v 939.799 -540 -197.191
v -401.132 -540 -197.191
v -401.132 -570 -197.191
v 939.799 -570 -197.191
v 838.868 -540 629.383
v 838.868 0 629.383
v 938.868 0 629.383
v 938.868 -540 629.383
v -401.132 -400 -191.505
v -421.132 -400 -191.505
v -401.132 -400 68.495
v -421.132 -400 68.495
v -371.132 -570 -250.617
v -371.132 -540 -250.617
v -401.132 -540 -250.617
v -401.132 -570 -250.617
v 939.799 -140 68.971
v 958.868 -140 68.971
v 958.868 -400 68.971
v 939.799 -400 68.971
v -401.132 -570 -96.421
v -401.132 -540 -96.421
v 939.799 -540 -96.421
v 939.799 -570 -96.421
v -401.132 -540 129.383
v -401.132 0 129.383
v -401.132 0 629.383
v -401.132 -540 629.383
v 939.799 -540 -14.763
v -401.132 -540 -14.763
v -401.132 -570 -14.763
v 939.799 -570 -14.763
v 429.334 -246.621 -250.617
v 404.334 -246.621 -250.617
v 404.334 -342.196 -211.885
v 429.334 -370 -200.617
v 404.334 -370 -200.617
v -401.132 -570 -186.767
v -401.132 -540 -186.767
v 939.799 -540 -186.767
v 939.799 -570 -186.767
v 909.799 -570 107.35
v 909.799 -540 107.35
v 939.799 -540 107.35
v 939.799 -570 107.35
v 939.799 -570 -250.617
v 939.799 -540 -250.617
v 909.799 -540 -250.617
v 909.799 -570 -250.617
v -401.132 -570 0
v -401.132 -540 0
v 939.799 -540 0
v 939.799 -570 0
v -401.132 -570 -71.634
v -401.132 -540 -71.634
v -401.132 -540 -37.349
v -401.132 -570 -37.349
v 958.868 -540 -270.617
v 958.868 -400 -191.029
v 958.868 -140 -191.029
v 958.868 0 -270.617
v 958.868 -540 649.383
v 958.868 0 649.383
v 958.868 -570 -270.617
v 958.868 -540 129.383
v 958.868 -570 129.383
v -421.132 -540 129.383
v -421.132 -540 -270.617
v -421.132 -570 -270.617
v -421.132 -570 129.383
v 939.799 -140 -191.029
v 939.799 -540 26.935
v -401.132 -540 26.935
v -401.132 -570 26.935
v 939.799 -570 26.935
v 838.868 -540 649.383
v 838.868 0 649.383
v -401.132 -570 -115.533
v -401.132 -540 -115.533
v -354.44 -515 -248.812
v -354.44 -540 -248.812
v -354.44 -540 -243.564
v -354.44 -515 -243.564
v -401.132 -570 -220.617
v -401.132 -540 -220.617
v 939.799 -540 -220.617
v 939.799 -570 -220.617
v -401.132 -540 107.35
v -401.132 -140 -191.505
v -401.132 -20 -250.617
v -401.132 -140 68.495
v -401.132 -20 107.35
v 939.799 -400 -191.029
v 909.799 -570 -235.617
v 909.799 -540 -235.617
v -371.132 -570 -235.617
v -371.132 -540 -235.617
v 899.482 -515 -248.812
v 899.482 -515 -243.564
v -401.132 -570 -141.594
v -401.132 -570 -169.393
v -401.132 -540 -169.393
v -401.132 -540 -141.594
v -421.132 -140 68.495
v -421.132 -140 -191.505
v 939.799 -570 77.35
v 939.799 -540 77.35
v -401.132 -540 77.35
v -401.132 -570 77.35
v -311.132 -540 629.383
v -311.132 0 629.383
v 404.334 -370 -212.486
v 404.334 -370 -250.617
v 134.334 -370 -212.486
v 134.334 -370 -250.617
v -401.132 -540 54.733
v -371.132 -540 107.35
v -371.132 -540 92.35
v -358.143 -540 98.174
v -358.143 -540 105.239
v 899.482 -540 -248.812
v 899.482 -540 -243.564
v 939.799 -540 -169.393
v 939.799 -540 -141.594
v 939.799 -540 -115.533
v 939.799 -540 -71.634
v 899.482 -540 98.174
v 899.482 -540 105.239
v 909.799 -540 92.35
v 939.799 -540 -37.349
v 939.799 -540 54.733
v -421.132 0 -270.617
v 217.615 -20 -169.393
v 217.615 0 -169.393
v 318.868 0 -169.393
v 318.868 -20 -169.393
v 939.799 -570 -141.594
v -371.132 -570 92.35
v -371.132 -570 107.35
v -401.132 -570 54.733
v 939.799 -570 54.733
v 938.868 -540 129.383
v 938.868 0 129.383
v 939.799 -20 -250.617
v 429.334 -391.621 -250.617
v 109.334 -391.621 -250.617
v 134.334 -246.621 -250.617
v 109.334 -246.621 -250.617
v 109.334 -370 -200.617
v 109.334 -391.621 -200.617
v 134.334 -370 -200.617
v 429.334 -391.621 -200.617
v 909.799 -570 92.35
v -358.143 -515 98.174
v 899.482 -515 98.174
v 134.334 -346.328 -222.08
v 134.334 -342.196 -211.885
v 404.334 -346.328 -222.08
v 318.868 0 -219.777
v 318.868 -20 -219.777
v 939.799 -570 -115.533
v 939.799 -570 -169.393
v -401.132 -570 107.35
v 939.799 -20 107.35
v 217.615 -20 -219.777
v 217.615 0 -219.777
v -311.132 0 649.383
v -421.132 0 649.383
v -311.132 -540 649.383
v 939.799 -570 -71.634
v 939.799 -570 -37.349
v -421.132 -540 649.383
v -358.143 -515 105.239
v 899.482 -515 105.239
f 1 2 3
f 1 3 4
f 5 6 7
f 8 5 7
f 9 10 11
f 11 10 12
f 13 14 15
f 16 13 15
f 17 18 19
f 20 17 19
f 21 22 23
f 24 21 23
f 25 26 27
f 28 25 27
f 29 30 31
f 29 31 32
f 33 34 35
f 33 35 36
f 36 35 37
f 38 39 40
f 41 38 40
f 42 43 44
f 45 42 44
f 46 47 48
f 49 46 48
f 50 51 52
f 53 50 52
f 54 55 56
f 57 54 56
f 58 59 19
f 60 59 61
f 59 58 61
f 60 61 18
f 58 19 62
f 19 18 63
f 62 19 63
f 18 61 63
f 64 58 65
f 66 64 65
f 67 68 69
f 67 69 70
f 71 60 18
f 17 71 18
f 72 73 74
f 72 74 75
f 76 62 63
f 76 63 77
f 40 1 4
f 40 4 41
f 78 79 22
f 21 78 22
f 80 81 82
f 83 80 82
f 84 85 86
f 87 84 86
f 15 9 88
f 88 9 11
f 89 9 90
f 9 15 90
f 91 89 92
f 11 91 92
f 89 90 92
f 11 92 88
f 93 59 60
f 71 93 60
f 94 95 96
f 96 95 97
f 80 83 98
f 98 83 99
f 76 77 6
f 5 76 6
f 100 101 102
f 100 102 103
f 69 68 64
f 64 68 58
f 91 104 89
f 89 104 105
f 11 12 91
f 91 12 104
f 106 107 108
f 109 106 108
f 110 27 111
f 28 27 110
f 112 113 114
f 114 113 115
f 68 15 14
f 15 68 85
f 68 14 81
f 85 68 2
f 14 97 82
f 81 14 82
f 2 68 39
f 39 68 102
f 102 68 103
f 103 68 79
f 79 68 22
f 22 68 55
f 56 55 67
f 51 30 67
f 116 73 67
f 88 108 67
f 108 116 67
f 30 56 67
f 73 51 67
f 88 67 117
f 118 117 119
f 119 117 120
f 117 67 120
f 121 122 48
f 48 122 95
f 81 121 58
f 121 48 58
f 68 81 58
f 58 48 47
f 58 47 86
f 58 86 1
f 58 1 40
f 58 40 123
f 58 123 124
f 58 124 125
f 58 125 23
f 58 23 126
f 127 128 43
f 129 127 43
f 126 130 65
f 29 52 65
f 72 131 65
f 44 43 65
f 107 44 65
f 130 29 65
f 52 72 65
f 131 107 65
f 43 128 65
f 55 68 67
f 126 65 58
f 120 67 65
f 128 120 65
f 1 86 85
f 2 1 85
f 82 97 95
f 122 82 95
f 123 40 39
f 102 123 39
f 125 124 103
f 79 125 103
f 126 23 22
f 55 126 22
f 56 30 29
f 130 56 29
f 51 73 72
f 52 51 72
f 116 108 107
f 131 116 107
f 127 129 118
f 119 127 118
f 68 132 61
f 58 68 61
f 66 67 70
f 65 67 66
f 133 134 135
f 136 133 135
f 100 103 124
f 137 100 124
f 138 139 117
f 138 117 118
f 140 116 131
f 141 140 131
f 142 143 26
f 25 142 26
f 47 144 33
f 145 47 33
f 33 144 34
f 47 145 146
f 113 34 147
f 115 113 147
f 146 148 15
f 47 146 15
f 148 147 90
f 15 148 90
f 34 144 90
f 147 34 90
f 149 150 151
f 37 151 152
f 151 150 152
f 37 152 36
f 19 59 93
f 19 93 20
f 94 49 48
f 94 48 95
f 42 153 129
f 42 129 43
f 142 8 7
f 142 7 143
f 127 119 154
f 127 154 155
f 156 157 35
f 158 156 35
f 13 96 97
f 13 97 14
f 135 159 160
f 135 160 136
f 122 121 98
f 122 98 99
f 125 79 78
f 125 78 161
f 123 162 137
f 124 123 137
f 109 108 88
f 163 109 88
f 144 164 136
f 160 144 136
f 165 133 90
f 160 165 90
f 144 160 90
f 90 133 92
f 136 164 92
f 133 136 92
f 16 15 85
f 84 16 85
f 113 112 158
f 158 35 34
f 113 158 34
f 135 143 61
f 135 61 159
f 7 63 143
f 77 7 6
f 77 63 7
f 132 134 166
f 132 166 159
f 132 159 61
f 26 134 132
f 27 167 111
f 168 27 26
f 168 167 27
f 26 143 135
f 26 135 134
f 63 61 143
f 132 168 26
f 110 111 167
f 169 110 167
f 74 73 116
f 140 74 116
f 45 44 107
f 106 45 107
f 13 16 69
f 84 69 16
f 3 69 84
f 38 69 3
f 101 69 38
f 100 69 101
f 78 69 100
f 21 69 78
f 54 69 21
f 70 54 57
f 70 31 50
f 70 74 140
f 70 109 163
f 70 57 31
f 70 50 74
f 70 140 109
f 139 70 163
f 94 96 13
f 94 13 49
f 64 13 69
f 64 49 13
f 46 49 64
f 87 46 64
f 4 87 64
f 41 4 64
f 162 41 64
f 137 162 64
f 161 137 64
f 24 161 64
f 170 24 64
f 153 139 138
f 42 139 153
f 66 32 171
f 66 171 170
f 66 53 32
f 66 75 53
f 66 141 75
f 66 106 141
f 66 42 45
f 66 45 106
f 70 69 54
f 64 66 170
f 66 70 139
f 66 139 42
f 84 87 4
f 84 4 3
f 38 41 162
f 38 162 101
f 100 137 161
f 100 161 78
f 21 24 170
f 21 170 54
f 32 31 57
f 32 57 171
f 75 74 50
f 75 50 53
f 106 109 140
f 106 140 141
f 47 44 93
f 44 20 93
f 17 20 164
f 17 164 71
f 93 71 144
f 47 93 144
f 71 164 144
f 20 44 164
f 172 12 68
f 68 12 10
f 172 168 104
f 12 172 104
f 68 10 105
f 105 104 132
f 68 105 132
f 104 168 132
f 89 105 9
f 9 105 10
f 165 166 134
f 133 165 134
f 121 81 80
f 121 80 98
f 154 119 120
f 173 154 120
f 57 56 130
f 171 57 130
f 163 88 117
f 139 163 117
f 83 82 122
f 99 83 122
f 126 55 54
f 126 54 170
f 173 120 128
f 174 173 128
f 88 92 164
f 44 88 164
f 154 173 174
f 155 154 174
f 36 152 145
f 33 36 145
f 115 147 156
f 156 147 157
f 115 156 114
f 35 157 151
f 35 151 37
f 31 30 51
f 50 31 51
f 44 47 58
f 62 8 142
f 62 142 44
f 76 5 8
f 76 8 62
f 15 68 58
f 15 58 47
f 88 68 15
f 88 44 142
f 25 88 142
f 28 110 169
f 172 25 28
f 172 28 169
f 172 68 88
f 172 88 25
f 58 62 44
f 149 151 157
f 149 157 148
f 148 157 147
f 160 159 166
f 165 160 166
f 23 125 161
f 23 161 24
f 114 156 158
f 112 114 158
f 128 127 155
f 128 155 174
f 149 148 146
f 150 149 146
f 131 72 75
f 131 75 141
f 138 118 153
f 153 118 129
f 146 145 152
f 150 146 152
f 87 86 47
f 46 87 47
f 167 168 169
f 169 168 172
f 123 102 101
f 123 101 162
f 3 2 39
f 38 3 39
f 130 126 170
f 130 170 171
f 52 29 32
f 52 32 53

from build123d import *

# Parameters (mm, degrees)
F1_DEPTH  = 540
F2_W      = 130
F2_H      = 130
F3_DEPTH  = 41.5
F5_W      = 130
F5_H      = 260
F6_DEPTH  = 250
F8_DEPTH  = 50
F9_W      = 1380
F9_H      = 400
F9_W_2    = 1340.93075037
F9_H_2    = 10.424464941
F9_H_3    = 27.7985781431
F9_H_4    = 19.1115215421
F9_H_5    = 34.2843079742
F9_H_6    = 14.7630823776
F9_H_7    = 27.7985557914
F11_DEPTH = 30
F10_W     = 1253.9217174053
F10_H     = 5.2477568388
F10_W_2   = 1257.6251924038
F10_H_2   = 7.0648565888
F12_DEPTH = 25
F13_W     = 1340.93075037
F13_H     = 357.9673457496
F14_DEPTH = 20
F16_DEPTH = 50
F18_DEPTH = 25
F20_DEPTH = 25
F21_W     = 270
F21_H     = 30
F22_DEPTH = 11
F23_W     = 50
F23_H     = 50.3848940134
F24_DEPTH = 60


# Not quite as in the source:
# - a feature names something its author has since deleted; it is built from what else it names


with BuildPart() as f1:
    # F0 (on Front) → F1 (new body)
    with BuildSketch(Plane.XZ):
        Polygon((-401.131799221, 210.1073265076), (-401.131799221, 629.3826087959), (-361.131799221, 629.3826087959), (-361.131799221, 649.3826087959), (-421.131799221, 649.3826087959), (-421.131799221, -270.6173912041), (958.868200779, -270.6173912041), (958.868200779, 649.3826087959), (838.868200779, 649.3826087959), (838.868200779, 629.3826087959), (938.868200779, 629.3826087959), (938.868200779, 210.1073265076), (938.868200779, 129.3826087959), (-401.131799221, 129.3826087959), align=None)
        Polygon((938.868200779, -250.6173912041), (-401.131799221, -250.6173912041), (-401.131799221, 107.3499545455), (939.798951149, 107.3499545455), (939.798951149, -250.6173912041), align=None, mode=Mode.SUBTRACT)
    extrude(amount=F1_DEPTH)


with BuildPart() as f3:
    # F2 (on face) → F3 (new body, symmetric)
    with BuildSketch(Plane(origin=(-421.131799221, 0, 0), x_dir=(0, -1, 0), z_dir=(-1, 0, 0))):
        with Locations((205, 3.4951143172)):
            Rectangle(F2_W, F2_H)
        with Locations((335, 3.4951143172)):
            Rectangle(F2_W, F2_H)
        with Locations((335, -126.5048856828)):
            Rectangle(F2_W, F2_H)
        with Locations((205, -126.5048856828)):
            Rectangle(F2_W, F2_H)
    extrude(amount=F3_DEPTH, both=True)


with BuildPart() as f1_1:
    add(f1.part)

    # F4: cut F3
    add(f3.part, mode=Mode.SUBTRACT)


with BuildPart() as f6:
    # F5 (on face) → F6 (new body, symmetric)
    with BuildSketch(Plane.YZ.offset(958.868200779)):
        with Locations((-205, -61.0292432997)):
            Rectangle(F5_W, F5_H)
        with Locations((-335, -61.0292432997)):
            Rectangle(F5_W, F5_H)
    extrude(amount=F6_DEPTH, both=True)


with BuildPart() as f1_2:
    add(f1_1.part)

    # F7: cut F6
    add(f6.part, mode=Mode.SUBTRACT)

    # F8 (add): a face of the model
    f8_faces = [f1_2.faces().sort_by_distance(p)[0] for p in [
        (-361.131799221, -270, 639.3826087959),
    ]]
    extrude(f8_faces, amount=F8_DEPTH)

    # F13 (on face) → F14 (join)
    with BuildSketch(Plane(origin=(0, 0, 0), x_dir=(-1, 0, 0), z_dir=(0, 1, 0))):
        with Locations((-269.333575964, -71.6337183293)):
            Rectangle(F13_W, F13_H)
    extrude(amount=-F14_DEPTH)

    # F15 (on face) → F16 (join)
    with BuildSketch(Plane.XY.offset(-250.6173912041)):
        Polygon((404.333575964, -370), (269.333575964, -370), (134.333575964, -370), (134.333575964, -391.6209638119), (210.3650718927, -391.6209638119), (269.333575964, -391.6209638119), (404.333575964, -391.6209638119), align=None)
    extrude(amount=F16_DEPTH)

    # F17 (on face) → F18 (join)
    with BuildSketch(Plane.YZ.offset(404.333575964)):
        Polygon((-391.6209638119, -200.6173912041), (-391.6209638119, -250.6173912041), (-246.6209638119, -250.6173912041), (-370, -200.6173912041), align=None)
    extrude(amount=F18_DEPTH)

    # F19 (on face) → F20 (join)
    with BuildSketch(Plane(origin=(134.333575964, 0, 0), x_dir=(0, -1, 0), z_dir=(-1, 0, 0))):
        Polygon((246.6209638119, -250.6173912041), (391.6209638119, -250.6173912041), (391.6209638119, -200.6173912041), (370, -200.6173912041), align=None)
    extrude(amount=F20_DEPTH)

    # F21 (on face) → F22 (join)
    with BuildSketch(Plane(origin=(0, -122.0263992007, -301.1099904579), x_dir=(1, 0, 0), z_dir=(0, 0.3755855729, 0.9267877197))):
        with Locations((269.333575964, -252.5624584992)):
            Rectangle(F21_W, F21_H)
    extrude(amount=-F22_DEPTH)


with BuildPart() as f11:
    # F9 (on face) → F11 (new body)
    with BuildSketch(Plane.XZ.offset(540)):
        with Locations((268.868200779, -70.6173912041)):
            Rectangle(F9_W, F9_H)
        Polygon((-371.131799221, -250.6173912041), (-401.131799221, -250.6173912041), (-401.131799221, -220.6173912041), (-371.131799221, -220.6173912041), (909.798951149, -220.6173912041), (939.798951149, -220.6173912041), (939.798951149, -250.6173912041), (909.798951149, -250.6173912041), (909.798951149, -235.6173912041), (-371.131799221, -235.6173912041), align=None, mode=Mode.SUBTRACT)
        with Locations((269.333575964, -191.9789165258)):
            Rectangle(F9_W_2, F9_H_2, mode=Mode.SUBTRACT)
        with Locations((269.333575964, -155.4932966828)):
            Rectangle(F9_W_2, F9_H_3, mode=Mode.SUBTRACT)
        with Locations((269.333575964, -105.9771068394)):
            Rectangle(F9_W_2, F9_H_4, mode=Mode.SUBTRACT)
        with Locations((269.333575964, -54.4915643422)):
            Rectangle(F9_W_2, F9_H_5, mode=Mode.SUBTRACT)
        with Locations((269.333575964, -7.3815411888)):
            Rectangle(F9_W_2, F9_H_6, mode=Mode.SUBTRACT)
        with Locations((269.333575964, 40.834043175)):
            Rectangle(F9_W_2, F9_H_7, mode=Mode.SUBTRACT)
        Polygon((-401.131799221, 77.3499545455), (-401.131799221, 107.3499545455), (-371.131799221, 107.3499545455), (-371.131799221, 92.3499545455), (-364.3079102039, 92.3499545455), (909.798951149, 92.3499545455), (909.798951149, 107.3499545455), (939.798951149, 107.3499545455), (939.798951149, 77.3499545455), (909.798951149, 77.3499545455), (-364.3079102039, 77.3499545455), (-371.131799221, 77.3499545455), align=None, mode=Mode.SUBTRACT)
    extrude(amount=F11_DEPTH)

    # F10 (on face) → F12 (join)
    with BuildSketch(Plane.XZ.offset(540)):
        with Locations((272.5210934877, -246.1882457137)):
            Rectangle(F10_W, F10_H)
        with Locations((270.6693559885, 101.7066277564)):
            Rectangle(F10_W_2, F10_H_2)
    extrude(amount=-F12_DEPTH)


with BuildPart() as f24:
    # F23 (on face) → F24 (new body)
    with BuildSketch(Plane(origin=(0, 0, 0), x_dir=(-1, 0, 0), z_dir=(0, 1, 0))):
        Polygon((-268.868200779, -169.3925857544), (-268.868200779, -219.7774797678), (-218.868200779, -219.7774797678), (-217.6146060228, -219.7774797678), (-217.6146060228, -169.3925857544), align=None)
        with Locations((-293.868200779, -194.5850327611)):
            Rectangle(F23_W, F23_H)
    extrude(amount=-F24_DEPTH)


with BuildPart() as f1_3:
    add(f1_2.part)

    # F25: cut F24
    add(f24.part, mode=Mode.SUBTRACT)


solid = Compound([f11.part, f1_3.part])
